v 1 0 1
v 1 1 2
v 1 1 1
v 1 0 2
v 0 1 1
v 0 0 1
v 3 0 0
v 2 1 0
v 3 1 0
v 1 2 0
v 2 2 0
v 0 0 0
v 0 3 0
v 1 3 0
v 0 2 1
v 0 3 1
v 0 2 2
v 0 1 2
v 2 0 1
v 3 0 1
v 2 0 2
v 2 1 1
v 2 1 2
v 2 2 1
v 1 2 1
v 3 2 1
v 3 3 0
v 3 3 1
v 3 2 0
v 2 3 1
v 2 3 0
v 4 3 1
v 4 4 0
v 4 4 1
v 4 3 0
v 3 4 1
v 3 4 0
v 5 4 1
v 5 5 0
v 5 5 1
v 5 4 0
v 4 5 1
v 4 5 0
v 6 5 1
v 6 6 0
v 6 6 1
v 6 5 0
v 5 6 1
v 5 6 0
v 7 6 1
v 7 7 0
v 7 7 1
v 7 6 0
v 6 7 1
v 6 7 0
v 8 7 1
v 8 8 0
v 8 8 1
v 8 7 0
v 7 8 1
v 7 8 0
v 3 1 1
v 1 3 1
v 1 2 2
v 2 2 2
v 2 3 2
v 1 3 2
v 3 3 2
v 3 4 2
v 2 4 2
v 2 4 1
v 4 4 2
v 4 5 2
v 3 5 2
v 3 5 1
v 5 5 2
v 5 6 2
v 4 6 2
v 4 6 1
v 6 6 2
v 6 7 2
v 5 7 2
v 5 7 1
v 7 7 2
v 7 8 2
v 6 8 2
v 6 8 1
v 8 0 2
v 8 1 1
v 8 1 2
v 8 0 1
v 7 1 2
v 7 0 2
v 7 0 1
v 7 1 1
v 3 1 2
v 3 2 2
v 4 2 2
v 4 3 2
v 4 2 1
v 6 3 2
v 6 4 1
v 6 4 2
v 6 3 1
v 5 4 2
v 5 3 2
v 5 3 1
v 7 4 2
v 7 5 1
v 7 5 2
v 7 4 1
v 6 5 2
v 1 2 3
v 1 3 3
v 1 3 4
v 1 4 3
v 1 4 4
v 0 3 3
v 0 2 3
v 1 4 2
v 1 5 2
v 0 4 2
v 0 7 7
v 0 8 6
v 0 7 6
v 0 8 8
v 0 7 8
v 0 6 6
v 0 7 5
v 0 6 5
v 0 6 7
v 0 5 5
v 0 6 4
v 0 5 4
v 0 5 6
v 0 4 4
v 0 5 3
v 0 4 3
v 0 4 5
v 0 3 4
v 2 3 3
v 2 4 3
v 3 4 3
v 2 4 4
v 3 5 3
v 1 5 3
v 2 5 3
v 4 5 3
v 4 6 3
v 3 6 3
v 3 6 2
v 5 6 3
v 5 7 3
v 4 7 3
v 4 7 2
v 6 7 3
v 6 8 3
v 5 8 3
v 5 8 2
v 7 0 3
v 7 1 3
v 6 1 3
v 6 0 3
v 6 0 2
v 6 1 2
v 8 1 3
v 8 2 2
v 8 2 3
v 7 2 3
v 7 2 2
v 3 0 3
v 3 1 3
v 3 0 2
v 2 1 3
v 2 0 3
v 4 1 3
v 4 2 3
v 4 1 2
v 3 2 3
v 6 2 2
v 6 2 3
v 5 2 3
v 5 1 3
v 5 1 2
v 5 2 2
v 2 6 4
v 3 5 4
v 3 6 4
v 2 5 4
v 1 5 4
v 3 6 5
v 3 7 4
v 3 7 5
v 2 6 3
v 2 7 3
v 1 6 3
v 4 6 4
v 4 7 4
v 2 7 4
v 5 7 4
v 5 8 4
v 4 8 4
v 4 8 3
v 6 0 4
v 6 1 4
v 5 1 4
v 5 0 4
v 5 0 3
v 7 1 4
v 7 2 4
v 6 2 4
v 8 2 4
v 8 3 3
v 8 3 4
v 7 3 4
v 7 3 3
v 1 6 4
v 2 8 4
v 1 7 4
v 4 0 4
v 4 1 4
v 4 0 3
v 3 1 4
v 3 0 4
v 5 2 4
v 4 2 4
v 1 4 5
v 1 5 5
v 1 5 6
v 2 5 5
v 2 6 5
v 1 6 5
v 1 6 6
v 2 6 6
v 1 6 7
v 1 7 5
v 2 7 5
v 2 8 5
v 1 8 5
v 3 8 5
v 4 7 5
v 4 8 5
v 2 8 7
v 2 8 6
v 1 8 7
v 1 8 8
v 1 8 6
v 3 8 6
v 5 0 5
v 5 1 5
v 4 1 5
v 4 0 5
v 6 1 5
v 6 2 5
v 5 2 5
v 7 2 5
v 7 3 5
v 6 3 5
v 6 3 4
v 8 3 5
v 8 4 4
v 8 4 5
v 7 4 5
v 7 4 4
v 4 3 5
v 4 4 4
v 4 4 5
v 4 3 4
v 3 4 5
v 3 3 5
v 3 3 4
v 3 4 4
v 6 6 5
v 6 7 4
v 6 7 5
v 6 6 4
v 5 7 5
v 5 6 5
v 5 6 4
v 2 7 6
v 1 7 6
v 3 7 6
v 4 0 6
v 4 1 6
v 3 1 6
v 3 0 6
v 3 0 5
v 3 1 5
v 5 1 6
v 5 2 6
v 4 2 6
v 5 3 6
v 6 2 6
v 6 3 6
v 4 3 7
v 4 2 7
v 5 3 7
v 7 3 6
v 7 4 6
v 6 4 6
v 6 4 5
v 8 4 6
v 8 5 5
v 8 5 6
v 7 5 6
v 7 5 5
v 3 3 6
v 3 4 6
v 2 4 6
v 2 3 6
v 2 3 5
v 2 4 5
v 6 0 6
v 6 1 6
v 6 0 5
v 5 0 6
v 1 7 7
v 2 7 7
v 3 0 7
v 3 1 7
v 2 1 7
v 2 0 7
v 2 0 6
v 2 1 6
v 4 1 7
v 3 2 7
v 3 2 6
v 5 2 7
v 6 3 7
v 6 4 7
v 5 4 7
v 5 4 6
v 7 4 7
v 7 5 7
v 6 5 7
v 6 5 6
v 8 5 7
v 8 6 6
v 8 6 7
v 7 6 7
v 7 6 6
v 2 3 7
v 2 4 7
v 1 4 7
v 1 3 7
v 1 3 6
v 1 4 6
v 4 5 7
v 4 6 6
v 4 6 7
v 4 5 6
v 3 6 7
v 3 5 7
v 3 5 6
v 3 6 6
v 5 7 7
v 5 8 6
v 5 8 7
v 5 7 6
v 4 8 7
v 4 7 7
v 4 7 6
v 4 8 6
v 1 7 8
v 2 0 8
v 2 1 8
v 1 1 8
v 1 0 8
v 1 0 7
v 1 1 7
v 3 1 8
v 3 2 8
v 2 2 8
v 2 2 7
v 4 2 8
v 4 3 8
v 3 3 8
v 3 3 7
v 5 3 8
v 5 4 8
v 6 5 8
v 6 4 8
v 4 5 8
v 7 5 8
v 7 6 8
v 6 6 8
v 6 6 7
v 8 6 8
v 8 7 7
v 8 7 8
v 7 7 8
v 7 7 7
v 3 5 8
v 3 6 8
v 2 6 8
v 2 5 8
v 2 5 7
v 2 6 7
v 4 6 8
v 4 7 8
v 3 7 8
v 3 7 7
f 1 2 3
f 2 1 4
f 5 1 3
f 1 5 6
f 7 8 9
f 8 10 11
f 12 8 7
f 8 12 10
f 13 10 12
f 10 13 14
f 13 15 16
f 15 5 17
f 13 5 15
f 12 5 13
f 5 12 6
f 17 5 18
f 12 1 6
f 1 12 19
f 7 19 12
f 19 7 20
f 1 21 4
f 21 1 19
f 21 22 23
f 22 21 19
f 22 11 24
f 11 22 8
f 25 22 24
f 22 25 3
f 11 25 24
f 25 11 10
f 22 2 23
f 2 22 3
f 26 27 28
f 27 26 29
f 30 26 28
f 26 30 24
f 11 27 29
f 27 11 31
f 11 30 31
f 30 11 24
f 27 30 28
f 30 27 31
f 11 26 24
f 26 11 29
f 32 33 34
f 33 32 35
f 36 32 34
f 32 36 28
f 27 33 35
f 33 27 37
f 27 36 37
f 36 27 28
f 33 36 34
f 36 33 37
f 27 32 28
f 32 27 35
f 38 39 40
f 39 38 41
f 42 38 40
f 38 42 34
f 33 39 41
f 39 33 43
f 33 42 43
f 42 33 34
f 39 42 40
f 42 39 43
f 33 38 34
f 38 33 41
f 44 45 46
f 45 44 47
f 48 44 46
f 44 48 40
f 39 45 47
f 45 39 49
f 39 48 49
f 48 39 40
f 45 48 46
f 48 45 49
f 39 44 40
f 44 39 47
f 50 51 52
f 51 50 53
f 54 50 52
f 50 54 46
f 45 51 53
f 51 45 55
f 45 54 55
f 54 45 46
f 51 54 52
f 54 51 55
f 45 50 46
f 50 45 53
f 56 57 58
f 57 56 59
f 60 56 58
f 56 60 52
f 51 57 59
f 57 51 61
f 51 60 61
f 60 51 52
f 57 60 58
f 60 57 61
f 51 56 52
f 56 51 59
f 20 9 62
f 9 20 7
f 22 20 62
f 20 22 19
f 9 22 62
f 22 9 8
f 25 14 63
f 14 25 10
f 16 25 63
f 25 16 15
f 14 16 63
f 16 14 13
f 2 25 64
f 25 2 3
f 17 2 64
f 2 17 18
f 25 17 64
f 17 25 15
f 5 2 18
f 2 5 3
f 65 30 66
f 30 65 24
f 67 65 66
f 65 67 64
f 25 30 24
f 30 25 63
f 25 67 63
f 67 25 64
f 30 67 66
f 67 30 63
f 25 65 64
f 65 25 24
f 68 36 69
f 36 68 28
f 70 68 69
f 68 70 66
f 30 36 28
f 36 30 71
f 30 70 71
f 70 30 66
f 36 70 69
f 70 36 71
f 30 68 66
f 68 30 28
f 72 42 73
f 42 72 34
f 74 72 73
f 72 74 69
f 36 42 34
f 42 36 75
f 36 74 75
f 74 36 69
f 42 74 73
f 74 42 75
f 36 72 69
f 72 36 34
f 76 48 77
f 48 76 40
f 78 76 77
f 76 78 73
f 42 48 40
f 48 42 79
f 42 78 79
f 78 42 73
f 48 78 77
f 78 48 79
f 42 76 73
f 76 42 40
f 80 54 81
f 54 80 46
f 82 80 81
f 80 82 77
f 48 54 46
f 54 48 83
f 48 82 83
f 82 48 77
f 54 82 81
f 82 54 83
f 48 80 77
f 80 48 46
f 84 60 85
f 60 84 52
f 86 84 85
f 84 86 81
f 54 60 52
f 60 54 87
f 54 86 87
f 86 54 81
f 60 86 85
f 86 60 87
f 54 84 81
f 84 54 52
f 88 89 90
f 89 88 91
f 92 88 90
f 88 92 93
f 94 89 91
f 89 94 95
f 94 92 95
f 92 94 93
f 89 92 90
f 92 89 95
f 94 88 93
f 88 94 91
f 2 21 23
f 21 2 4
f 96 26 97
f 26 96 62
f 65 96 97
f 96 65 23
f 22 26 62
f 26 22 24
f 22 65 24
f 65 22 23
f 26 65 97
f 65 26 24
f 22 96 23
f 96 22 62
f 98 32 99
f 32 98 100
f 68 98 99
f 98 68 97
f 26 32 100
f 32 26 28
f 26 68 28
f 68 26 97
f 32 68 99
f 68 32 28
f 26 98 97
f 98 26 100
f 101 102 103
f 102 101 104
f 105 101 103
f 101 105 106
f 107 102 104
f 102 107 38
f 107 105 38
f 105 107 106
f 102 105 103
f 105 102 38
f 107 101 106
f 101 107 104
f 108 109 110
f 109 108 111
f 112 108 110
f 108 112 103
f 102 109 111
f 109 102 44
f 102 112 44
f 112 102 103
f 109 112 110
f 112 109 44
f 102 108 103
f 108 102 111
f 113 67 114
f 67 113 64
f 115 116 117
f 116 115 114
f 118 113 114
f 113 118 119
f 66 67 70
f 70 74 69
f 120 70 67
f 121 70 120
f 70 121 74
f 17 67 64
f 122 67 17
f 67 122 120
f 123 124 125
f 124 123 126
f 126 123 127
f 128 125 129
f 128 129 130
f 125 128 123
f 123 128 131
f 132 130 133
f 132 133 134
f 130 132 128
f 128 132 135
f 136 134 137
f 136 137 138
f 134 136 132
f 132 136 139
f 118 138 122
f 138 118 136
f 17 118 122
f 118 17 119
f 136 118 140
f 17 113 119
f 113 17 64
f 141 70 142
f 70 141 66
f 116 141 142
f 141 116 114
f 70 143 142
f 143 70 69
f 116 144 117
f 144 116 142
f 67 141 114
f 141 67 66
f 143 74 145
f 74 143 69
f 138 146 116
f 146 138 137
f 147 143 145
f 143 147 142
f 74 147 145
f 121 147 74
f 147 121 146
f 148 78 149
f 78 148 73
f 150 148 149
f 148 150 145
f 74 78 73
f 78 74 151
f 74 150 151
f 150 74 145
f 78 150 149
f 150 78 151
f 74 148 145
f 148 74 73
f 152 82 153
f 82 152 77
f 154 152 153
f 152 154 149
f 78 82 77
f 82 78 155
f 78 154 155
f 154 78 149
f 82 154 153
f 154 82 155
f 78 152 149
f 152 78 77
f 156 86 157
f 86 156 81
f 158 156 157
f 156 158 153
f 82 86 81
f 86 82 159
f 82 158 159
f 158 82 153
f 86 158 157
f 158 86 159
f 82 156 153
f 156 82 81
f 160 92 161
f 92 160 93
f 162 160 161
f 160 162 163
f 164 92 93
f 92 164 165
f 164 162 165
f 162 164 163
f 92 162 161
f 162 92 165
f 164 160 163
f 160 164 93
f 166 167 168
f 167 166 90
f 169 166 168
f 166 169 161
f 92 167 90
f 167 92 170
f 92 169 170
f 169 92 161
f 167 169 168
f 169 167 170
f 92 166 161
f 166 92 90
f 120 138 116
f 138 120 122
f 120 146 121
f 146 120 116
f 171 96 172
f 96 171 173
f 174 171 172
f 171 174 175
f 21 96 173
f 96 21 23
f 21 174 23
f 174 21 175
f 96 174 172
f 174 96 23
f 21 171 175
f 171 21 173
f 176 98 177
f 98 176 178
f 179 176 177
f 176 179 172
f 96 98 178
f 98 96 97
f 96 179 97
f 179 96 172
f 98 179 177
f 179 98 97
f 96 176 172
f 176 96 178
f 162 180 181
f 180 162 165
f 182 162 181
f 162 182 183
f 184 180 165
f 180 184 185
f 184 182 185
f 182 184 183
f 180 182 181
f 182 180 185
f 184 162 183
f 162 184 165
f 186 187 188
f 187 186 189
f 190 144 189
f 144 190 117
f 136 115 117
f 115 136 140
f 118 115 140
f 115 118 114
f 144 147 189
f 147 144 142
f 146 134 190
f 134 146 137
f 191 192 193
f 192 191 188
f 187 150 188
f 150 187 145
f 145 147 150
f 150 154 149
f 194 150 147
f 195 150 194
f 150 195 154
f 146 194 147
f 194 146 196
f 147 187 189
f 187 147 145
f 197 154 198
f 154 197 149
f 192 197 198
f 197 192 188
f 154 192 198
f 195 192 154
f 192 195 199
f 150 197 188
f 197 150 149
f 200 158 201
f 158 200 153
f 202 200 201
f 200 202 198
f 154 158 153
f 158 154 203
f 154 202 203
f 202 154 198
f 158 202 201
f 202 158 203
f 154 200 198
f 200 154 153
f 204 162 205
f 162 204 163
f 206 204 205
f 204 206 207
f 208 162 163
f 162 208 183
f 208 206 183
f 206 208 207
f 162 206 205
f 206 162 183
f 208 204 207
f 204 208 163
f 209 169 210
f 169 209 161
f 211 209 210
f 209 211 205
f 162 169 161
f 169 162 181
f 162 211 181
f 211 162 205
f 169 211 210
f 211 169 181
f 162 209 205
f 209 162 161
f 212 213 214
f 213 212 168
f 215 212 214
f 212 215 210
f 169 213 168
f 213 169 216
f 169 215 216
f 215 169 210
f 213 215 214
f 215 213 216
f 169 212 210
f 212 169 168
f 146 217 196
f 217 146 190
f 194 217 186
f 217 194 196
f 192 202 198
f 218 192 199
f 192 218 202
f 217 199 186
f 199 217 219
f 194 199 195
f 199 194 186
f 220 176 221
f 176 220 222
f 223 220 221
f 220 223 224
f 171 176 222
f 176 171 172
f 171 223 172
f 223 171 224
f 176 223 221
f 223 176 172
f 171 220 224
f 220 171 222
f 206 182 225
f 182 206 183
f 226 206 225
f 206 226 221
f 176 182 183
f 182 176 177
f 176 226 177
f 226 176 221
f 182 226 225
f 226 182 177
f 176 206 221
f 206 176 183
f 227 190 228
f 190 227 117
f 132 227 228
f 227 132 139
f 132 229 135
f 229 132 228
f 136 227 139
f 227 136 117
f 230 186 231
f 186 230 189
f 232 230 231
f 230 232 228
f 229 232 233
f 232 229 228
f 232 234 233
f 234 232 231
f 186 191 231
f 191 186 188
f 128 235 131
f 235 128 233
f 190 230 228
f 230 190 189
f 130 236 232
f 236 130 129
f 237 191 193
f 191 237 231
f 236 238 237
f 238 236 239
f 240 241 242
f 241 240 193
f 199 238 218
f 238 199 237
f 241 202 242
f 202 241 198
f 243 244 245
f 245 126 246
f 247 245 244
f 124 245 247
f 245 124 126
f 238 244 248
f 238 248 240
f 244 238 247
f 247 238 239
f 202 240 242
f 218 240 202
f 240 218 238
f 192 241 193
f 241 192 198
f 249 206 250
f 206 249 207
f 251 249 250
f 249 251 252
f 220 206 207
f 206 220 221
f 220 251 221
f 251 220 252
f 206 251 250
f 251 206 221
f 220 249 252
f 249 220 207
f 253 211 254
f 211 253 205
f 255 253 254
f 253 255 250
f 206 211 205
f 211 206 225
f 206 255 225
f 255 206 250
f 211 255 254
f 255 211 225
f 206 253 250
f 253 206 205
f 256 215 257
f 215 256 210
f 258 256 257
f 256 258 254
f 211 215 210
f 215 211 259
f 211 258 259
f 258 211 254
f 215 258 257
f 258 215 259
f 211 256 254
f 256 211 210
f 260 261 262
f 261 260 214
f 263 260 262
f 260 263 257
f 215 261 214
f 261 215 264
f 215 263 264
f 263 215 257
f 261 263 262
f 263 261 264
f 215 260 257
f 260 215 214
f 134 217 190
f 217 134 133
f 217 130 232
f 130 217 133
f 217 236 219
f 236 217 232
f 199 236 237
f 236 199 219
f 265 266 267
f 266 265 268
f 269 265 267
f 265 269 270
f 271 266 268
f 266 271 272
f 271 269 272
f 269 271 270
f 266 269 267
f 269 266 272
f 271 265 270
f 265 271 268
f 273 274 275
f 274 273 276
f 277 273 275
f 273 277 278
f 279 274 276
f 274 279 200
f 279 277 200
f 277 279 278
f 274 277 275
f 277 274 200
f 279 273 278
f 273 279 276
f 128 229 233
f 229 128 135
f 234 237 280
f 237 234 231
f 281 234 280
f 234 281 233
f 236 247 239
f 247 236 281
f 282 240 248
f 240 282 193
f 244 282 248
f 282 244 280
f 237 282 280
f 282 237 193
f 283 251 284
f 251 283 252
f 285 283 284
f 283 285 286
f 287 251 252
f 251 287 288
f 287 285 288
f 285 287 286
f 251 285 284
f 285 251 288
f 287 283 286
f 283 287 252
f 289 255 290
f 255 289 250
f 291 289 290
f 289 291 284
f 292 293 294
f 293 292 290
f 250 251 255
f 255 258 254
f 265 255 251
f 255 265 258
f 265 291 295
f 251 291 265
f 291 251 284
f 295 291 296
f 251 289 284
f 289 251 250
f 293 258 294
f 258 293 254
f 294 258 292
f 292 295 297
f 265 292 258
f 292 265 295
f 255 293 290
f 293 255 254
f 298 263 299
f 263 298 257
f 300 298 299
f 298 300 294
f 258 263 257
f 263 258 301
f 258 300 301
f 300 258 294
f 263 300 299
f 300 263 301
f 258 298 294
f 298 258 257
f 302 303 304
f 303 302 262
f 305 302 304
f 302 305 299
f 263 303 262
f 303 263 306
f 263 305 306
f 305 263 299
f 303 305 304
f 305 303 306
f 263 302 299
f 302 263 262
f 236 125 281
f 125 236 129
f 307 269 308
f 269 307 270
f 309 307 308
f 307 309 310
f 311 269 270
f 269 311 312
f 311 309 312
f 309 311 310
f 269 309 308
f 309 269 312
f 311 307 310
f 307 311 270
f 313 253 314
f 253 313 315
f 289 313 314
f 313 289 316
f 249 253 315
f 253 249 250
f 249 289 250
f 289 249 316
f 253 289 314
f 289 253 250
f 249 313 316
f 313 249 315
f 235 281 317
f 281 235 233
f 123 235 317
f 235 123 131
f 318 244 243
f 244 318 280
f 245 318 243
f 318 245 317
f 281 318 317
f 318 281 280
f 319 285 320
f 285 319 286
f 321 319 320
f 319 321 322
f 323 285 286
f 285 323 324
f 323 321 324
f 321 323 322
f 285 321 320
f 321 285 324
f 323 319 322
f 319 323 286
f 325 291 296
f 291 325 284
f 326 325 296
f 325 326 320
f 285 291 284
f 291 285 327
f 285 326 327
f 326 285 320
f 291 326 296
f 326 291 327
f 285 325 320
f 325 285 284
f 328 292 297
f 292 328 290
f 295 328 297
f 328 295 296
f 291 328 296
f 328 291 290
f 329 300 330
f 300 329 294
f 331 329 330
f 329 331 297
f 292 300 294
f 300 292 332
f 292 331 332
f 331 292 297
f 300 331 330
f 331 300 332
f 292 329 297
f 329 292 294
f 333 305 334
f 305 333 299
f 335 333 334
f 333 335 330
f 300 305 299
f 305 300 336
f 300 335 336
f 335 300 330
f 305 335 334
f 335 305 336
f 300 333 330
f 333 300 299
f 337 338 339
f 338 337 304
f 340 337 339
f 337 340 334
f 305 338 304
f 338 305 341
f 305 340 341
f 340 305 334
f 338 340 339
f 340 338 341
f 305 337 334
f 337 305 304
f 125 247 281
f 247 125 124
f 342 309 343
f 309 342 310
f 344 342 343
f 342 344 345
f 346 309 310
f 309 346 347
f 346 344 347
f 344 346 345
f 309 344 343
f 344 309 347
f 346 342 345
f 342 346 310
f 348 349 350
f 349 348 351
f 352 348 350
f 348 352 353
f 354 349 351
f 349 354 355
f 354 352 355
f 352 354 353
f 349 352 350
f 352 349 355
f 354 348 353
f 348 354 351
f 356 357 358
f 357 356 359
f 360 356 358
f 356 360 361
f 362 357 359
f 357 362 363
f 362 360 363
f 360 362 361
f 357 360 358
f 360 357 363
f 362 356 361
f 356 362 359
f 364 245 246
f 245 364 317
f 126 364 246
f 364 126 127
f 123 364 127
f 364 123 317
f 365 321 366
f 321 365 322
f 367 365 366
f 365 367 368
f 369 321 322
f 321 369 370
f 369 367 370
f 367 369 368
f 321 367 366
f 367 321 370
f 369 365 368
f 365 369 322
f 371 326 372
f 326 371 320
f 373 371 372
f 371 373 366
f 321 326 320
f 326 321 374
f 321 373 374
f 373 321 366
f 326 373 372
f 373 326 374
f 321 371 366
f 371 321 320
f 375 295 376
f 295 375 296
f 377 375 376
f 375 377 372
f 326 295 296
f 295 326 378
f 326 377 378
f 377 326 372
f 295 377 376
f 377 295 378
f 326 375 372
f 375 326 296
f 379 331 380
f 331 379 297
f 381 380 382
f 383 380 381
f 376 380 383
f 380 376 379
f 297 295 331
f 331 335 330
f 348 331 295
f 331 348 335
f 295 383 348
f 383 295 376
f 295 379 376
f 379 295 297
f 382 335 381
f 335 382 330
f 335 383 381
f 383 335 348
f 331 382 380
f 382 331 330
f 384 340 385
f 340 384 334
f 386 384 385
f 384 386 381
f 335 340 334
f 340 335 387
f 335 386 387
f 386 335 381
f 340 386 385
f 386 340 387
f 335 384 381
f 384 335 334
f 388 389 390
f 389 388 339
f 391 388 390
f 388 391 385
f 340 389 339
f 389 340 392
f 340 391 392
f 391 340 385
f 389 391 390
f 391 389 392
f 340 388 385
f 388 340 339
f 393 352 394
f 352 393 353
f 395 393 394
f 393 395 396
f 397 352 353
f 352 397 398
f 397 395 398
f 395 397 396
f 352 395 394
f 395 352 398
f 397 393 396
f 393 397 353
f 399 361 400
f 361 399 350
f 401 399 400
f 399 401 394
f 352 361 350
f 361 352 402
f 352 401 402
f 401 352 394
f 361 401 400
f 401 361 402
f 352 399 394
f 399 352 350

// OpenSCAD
union() {
    translate([0, 0, 0]) cube([1, 1, 1]);
    translate([1, 1, 0]) cube([1, 1, 1]);
    translate([2, 2, 0]) cube([1, 1, 1]);
    translate([3, 3, 0]) cube([1, 1, 1]);
    translate([4, 4, 0]) cube([1, 1, 1]);
    translate([5, 5, 0]) cube([1, 1, 1]);
    translate([6, 6, 0]) cube([1, 1, 1]);
    translate([7, 7, 0]) cube([1, 1, 1]);
    translate([0, 1, 0]) cube([1, 1, 1]);
    translate([1, 0, 0]) cube([1, 1, 1]);
    translate([2, 0, 0]) cube([1, 1, 1]);
    translate([0, 2, 0]) cube([1, 1, 1]);
    translate([0, 1, 1]) cube([1, 1, 1]);
    translate([1, 2, 1]) cube([1, 1, 1]);
    translate([2, 3, 1]) cube([1, 1, 1]);
    translate([3, 4, 1]) cube([1, 1, 1]);
    translate([4, 5, 1]) cube([1, 1, 1]);
    translate([5, 6, 1]) cube([1, 1, 1]);
    translate([6, 7, 1]) cube([1, 1, 1]);
    translate([7, 0, 1]) cube([1, 1, 1]);
    translate([1, 0, 1]) cube([1, 1, 1]);
    translate([2, 1, 1]) cube([1, 1, 1]);
    translate([3, 2, 1]) cube([1, 1, 1]);
    translate([5, 3, 1]) cube([1, 1, 1]);
    translate([6, 4, 1]) cube([1, 1, 1]);
    translate([0, 2, 2]) cube([1, 1, 1]);
    translate([1, 3, 2]) cube([1, 1, 1]);
    translate([2, 4, 2]) cube([1, 1, 1]);
    translate([3, 5, 2]) cube([1, 1, 1]);
    translate([4, 6, 2]) cube([1, 1, 1]);
    translate([5, 7, 2]) cube([1, 1, 1]);
    translate([6, 0, 2]) cube([1, 1, 1]);
    translate([7, 1, 2]) cube([1, 1, 1]);
    translate([0, 3, 2]) cube([1, 1, 1]);
    translate([1, 4, 2]) cube([1, 1, 1]);
    translate([2, 0, 2]) cube([1, 1, 1]);
    translate([3, 1, 2]) cube([1, 1, 1]);
    translate([5, 1, 2]) cube([1, 1, 1]);
    translate([0, 3, 3]) cube([1, 1, 1]);
    translate([1, 4, 3]) cube([1, 1, 1]);
    translate([2, 5, 3]) cube([1, 1, 1]);
    translate([3, 6, 3]) cube([1, 1, 1]);
    translate([4, 7, 3]) cube([1, 1, 1]);
    translate([5, 0, 3]) cube([1, 1, 1]);
    translate([6, 1, 3]) cube([1, 1, 1]);
    translate([7, 2, 3]) cube([1, 1, 1]);
    translate([0, 4, 3]) cube([1, 1, 1]);
    translate([1, 5, 3]) cube([1, 1, 1]);
    translate([2, 6, 3]) cube([1, 1, 1]);
    translate([3, 0, 3]) cube([1, 1, 1]);
    translate([4, 1, 3]) cube([1, 1, 1]);
    translate([0, 4, 4]) cube([1, 1, 1]);
    translate([1, 5, 4]) cube([1, 1, 1]);
    translate([2, 6, 4]) cube([1, 1, 1]);
    translate([3, 7, 4]) cube([1, 1, 1]);
    translate([4, 0, 4]) cube([1, 1, 1]);
    translate([5, 1, 4]) cube([1, 1, 1]);
    translate([6, 2, 4]) cube([1, 1, 1]);
    translate([7, 3, 4]) cube([1, 1, 1]);
    translate([0, 5, 4]) cube([1, 1, 1]);
    translate([1, 6, 4]) cube([1, 1, 1]);
    translate([2, 7, 4]) cube([1, 1, 1]);
    translate([3, 3, 4]) cube([1, 1, 1]);
    translate([5, 6, 4]) cube([1, 1, 1]);
    translate([0, 5, 5]) cube([1, 1, 1]);
    translate([1, 6, 5]) cube([1, 1, 1]);
    translate([2, 7, 5]) cube([1, 1, 1]);
    translate([3, 0, 5]) cube([1, 1, 1]);
    translate([4, 1, 5]) cube([1, 1, 1]);
    translate([5, 2, 5]) cube([1, 1, 1]);
    translate([6, 3, 5]) cube([1, 1, 1]);
    translate([7, 4, 5]) cube([1, 1, 1]);
    translate([0, 6, 5]) cube([1, 1, 1]);
    translate([1, 7, 5]) cube([1, 1, 1]);
    translate([2, 3, 5]) cube([1, 1, 1]);
    translate([4, 2, 5]) cube([1, 1, 1]);
    translate([5, 0, 5]) cube([1, 1, 1]);
    translate([0, 6, 6]) cube([1, 1, 1]);
    translate([1, 7, 6]) cube([1, 1, 1]);
    translate([2, 0, 6]) cube([1, 1, 1]);
    translate([3, 1, 6]) cube([1, 1, 1]);
    translate([4, 2, 6]) cube([1, 1, 1]);
    translate([5, 3, 6]) cube([1, 1, 1]);
    translate([6, 4, 6]) cube([1, 1, 1]);
    translate([7, 5, 6]) cube([1, 1, 1]);
    translate([0, 7, 6]) cube([1, 1, 1]);
    translate([1, 3, 6]) cube([1, 1, 1]);
    translate([3, 5, 6]) cube([1, 1, 1]);
    translate([4, 7, 6]) cube([1, 1, 1]);
    translate([0, 7, 7]) cube([1, 1, 1]);
    translate([1, 0, 7]) cube([1, 1, 1]);
    translate([2, 1, 7]) cube([1, 1, 1]);
    translate([3, 2, 7]) cube([1, 1, 1]);
    translate([4, 3, 7]) cube([1, 1, 1]);
    translate([5, 4, 7]) cube([1, 1, 1]);
    translate([6, 5, 7]) cube([1, 1, 1]);
    translate([7, 6, 7]) cube([1, 1, 1]);
    translate([2, 5, 7]) cube([1, 1, 1]);
    translate([3, 6, 7]) cube([1, 1, 1]);
    translate([4, 4, 7]) cube([1, 1, 1]);
}
